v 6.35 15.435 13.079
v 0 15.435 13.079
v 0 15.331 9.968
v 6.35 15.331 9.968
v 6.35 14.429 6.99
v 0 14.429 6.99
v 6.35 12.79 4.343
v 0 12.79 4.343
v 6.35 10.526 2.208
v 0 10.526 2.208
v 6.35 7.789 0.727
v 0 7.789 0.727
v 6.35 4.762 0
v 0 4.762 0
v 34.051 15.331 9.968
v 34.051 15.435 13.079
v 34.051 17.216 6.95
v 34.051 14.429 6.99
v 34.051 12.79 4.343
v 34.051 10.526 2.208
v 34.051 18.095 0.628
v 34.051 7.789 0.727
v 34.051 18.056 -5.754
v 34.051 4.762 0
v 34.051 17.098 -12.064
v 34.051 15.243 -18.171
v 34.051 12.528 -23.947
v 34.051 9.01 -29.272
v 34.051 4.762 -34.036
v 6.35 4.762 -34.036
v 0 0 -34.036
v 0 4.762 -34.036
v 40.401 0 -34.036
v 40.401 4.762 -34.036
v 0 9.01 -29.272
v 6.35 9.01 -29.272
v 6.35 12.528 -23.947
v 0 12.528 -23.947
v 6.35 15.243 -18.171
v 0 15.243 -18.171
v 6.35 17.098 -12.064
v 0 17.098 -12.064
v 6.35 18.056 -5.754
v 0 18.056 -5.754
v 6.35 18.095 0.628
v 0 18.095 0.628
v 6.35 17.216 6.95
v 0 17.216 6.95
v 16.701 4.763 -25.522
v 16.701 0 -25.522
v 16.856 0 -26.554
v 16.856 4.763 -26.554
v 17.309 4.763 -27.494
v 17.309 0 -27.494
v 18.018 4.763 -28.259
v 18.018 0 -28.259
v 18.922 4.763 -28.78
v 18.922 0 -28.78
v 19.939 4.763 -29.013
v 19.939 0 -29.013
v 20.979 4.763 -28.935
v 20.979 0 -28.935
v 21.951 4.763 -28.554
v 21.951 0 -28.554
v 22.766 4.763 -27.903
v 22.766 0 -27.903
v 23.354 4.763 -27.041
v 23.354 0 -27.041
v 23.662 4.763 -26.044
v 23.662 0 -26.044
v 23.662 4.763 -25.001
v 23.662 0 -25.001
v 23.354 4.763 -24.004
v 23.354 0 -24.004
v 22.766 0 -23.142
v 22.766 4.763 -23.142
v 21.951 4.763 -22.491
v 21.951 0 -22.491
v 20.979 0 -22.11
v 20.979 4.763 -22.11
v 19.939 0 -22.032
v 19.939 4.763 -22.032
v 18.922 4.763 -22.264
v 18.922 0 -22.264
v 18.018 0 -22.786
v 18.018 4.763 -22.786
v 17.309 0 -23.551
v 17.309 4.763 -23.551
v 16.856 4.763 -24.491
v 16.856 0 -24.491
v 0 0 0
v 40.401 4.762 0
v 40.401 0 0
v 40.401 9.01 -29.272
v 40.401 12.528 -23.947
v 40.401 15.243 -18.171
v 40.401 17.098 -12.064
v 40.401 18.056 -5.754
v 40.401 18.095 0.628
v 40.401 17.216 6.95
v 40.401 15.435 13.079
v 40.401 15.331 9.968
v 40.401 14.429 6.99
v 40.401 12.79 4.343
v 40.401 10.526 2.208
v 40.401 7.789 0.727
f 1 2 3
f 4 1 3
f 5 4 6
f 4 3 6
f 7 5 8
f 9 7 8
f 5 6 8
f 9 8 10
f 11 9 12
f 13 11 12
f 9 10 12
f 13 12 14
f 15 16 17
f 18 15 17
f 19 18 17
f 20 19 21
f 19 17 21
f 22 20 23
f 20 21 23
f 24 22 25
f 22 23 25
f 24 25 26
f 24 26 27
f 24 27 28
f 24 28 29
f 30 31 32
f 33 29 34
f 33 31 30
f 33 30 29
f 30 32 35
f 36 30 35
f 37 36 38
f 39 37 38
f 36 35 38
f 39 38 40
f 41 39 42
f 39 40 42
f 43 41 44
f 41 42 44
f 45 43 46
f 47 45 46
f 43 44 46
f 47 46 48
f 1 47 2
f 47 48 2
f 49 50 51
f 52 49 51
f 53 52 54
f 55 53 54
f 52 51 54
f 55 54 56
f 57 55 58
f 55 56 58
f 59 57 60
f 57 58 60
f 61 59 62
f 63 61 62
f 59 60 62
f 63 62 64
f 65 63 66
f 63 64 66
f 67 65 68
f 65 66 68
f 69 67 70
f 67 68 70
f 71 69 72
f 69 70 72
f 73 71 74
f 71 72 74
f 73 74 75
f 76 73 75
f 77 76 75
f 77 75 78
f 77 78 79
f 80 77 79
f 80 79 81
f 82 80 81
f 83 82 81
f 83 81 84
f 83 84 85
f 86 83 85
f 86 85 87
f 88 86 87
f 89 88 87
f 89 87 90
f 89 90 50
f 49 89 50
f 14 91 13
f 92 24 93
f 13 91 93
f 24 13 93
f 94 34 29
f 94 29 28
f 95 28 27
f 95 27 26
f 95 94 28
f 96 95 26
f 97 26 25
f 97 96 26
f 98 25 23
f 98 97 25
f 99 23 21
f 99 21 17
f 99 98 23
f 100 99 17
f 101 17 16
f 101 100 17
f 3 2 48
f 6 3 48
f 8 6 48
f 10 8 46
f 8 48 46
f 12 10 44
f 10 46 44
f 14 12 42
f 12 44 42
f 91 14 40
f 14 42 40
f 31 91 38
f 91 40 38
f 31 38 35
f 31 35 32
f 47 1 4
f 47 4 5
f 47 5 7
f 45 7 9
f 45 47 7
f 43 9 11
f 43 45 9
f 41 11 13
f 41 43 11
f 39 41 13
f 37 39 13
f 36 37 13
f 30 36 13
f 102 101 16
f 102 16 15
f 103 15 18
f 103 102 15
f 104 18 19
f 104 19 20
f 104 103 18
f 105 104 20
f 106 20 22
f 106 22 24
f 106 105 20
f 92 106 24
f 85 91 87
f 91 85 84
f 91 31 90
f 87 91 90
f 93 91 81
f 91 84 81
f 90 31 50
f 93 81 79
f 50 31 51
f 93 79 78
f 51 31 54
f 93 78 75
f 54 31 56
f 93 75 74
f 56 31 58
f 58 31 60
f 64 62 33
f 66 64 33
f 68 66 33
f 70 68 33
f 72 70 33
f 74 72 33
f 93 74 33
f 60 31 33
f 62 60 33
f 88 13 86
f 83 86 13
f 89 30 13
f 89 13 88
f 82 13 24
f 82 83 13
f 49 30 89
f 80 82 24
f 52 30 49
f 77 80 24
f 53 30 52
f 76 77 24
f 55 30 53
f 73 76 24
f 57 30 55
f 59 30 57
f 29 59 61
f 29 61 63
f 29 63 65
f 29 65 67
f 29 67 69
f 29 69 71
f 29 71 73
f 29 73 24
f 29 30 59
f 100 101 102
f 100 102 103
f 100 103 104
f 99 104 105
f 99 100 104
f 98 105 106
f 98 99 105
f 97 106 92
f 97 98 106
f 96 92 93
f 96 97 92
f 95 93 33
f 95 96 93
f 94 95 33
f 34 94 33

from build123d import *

# Parameters (mm, degrees)
SKETCH1_W            = 40.40124
SKETCH1_H            = 34.036
SKETCH1_R            = 1.257288094
BOSS_EXTRUDE1_DEPTH  = 4.7625
M6_CLEARANCE_HOLE1_D = 7
BOSS_EXTRUDE3_DEPTH  = 6.35


with BuildPart() as part:
    # Sketch1 → Boss-Extrude1 (new body)
    with BuildSketch(Plane(origin=(0, 0, 0), x_dir=(1, 0, 0), z_dir=(0, 1, 0))):
        with Locations((20.20062, 17.018)):
            Rectangle(SKETCH1_W, SKETCH1_H)
        with Locations(Location((20.20062, 25.522416525, 0), (0, 0, 90))):
            Circle(SKETCH1_R, mode=Mode.SUBTRACT)
    extrude(amount=BOSS_EXTRUDE1_DEPTH)

    # M6 Clearance Hole1 (through all)
    with Locations(Plane(origin=(0, 4.7625, 0), x_dir=(1, 0, 0), z_dir=(0, 1, 0))):
        with Locations((20.20062, 25.522416525)):
            Hole(M6_CLEARANCE_HOLE1_D / 2)

    # Sketch5 → Boss-Extrude3 (add)
    with BuildSketch(Plane(origin=(40.40124, 0, 0), x_dir=(0, 0, -1), z_dir=(1, 0, 0))):
        with BuildLine():
            Line((0, 4.7625), (34.036, 4.7625))
            ThreePointArc((34.036, 4.7625), (12.064122693, 17.098372866), (-13.078907049, 15.43548166))
            ThreePointArc((-13.078907049, 15.43548166), (-4.343178895, 12.790354185), (0, 4.7625))
        make_face()
    boss_extrude3 = extrude(amount=-BOSS_EXTRUDE3_DEPTH)

    # Mirror1: Boss-Extrude3 across plane
    add(boss_extrude3.mirror(Plane(origin=(20.20062, 0, 0), x_dir=(0, 0, 1), z_dir=(1, 0, 0))))


solid = part.part
